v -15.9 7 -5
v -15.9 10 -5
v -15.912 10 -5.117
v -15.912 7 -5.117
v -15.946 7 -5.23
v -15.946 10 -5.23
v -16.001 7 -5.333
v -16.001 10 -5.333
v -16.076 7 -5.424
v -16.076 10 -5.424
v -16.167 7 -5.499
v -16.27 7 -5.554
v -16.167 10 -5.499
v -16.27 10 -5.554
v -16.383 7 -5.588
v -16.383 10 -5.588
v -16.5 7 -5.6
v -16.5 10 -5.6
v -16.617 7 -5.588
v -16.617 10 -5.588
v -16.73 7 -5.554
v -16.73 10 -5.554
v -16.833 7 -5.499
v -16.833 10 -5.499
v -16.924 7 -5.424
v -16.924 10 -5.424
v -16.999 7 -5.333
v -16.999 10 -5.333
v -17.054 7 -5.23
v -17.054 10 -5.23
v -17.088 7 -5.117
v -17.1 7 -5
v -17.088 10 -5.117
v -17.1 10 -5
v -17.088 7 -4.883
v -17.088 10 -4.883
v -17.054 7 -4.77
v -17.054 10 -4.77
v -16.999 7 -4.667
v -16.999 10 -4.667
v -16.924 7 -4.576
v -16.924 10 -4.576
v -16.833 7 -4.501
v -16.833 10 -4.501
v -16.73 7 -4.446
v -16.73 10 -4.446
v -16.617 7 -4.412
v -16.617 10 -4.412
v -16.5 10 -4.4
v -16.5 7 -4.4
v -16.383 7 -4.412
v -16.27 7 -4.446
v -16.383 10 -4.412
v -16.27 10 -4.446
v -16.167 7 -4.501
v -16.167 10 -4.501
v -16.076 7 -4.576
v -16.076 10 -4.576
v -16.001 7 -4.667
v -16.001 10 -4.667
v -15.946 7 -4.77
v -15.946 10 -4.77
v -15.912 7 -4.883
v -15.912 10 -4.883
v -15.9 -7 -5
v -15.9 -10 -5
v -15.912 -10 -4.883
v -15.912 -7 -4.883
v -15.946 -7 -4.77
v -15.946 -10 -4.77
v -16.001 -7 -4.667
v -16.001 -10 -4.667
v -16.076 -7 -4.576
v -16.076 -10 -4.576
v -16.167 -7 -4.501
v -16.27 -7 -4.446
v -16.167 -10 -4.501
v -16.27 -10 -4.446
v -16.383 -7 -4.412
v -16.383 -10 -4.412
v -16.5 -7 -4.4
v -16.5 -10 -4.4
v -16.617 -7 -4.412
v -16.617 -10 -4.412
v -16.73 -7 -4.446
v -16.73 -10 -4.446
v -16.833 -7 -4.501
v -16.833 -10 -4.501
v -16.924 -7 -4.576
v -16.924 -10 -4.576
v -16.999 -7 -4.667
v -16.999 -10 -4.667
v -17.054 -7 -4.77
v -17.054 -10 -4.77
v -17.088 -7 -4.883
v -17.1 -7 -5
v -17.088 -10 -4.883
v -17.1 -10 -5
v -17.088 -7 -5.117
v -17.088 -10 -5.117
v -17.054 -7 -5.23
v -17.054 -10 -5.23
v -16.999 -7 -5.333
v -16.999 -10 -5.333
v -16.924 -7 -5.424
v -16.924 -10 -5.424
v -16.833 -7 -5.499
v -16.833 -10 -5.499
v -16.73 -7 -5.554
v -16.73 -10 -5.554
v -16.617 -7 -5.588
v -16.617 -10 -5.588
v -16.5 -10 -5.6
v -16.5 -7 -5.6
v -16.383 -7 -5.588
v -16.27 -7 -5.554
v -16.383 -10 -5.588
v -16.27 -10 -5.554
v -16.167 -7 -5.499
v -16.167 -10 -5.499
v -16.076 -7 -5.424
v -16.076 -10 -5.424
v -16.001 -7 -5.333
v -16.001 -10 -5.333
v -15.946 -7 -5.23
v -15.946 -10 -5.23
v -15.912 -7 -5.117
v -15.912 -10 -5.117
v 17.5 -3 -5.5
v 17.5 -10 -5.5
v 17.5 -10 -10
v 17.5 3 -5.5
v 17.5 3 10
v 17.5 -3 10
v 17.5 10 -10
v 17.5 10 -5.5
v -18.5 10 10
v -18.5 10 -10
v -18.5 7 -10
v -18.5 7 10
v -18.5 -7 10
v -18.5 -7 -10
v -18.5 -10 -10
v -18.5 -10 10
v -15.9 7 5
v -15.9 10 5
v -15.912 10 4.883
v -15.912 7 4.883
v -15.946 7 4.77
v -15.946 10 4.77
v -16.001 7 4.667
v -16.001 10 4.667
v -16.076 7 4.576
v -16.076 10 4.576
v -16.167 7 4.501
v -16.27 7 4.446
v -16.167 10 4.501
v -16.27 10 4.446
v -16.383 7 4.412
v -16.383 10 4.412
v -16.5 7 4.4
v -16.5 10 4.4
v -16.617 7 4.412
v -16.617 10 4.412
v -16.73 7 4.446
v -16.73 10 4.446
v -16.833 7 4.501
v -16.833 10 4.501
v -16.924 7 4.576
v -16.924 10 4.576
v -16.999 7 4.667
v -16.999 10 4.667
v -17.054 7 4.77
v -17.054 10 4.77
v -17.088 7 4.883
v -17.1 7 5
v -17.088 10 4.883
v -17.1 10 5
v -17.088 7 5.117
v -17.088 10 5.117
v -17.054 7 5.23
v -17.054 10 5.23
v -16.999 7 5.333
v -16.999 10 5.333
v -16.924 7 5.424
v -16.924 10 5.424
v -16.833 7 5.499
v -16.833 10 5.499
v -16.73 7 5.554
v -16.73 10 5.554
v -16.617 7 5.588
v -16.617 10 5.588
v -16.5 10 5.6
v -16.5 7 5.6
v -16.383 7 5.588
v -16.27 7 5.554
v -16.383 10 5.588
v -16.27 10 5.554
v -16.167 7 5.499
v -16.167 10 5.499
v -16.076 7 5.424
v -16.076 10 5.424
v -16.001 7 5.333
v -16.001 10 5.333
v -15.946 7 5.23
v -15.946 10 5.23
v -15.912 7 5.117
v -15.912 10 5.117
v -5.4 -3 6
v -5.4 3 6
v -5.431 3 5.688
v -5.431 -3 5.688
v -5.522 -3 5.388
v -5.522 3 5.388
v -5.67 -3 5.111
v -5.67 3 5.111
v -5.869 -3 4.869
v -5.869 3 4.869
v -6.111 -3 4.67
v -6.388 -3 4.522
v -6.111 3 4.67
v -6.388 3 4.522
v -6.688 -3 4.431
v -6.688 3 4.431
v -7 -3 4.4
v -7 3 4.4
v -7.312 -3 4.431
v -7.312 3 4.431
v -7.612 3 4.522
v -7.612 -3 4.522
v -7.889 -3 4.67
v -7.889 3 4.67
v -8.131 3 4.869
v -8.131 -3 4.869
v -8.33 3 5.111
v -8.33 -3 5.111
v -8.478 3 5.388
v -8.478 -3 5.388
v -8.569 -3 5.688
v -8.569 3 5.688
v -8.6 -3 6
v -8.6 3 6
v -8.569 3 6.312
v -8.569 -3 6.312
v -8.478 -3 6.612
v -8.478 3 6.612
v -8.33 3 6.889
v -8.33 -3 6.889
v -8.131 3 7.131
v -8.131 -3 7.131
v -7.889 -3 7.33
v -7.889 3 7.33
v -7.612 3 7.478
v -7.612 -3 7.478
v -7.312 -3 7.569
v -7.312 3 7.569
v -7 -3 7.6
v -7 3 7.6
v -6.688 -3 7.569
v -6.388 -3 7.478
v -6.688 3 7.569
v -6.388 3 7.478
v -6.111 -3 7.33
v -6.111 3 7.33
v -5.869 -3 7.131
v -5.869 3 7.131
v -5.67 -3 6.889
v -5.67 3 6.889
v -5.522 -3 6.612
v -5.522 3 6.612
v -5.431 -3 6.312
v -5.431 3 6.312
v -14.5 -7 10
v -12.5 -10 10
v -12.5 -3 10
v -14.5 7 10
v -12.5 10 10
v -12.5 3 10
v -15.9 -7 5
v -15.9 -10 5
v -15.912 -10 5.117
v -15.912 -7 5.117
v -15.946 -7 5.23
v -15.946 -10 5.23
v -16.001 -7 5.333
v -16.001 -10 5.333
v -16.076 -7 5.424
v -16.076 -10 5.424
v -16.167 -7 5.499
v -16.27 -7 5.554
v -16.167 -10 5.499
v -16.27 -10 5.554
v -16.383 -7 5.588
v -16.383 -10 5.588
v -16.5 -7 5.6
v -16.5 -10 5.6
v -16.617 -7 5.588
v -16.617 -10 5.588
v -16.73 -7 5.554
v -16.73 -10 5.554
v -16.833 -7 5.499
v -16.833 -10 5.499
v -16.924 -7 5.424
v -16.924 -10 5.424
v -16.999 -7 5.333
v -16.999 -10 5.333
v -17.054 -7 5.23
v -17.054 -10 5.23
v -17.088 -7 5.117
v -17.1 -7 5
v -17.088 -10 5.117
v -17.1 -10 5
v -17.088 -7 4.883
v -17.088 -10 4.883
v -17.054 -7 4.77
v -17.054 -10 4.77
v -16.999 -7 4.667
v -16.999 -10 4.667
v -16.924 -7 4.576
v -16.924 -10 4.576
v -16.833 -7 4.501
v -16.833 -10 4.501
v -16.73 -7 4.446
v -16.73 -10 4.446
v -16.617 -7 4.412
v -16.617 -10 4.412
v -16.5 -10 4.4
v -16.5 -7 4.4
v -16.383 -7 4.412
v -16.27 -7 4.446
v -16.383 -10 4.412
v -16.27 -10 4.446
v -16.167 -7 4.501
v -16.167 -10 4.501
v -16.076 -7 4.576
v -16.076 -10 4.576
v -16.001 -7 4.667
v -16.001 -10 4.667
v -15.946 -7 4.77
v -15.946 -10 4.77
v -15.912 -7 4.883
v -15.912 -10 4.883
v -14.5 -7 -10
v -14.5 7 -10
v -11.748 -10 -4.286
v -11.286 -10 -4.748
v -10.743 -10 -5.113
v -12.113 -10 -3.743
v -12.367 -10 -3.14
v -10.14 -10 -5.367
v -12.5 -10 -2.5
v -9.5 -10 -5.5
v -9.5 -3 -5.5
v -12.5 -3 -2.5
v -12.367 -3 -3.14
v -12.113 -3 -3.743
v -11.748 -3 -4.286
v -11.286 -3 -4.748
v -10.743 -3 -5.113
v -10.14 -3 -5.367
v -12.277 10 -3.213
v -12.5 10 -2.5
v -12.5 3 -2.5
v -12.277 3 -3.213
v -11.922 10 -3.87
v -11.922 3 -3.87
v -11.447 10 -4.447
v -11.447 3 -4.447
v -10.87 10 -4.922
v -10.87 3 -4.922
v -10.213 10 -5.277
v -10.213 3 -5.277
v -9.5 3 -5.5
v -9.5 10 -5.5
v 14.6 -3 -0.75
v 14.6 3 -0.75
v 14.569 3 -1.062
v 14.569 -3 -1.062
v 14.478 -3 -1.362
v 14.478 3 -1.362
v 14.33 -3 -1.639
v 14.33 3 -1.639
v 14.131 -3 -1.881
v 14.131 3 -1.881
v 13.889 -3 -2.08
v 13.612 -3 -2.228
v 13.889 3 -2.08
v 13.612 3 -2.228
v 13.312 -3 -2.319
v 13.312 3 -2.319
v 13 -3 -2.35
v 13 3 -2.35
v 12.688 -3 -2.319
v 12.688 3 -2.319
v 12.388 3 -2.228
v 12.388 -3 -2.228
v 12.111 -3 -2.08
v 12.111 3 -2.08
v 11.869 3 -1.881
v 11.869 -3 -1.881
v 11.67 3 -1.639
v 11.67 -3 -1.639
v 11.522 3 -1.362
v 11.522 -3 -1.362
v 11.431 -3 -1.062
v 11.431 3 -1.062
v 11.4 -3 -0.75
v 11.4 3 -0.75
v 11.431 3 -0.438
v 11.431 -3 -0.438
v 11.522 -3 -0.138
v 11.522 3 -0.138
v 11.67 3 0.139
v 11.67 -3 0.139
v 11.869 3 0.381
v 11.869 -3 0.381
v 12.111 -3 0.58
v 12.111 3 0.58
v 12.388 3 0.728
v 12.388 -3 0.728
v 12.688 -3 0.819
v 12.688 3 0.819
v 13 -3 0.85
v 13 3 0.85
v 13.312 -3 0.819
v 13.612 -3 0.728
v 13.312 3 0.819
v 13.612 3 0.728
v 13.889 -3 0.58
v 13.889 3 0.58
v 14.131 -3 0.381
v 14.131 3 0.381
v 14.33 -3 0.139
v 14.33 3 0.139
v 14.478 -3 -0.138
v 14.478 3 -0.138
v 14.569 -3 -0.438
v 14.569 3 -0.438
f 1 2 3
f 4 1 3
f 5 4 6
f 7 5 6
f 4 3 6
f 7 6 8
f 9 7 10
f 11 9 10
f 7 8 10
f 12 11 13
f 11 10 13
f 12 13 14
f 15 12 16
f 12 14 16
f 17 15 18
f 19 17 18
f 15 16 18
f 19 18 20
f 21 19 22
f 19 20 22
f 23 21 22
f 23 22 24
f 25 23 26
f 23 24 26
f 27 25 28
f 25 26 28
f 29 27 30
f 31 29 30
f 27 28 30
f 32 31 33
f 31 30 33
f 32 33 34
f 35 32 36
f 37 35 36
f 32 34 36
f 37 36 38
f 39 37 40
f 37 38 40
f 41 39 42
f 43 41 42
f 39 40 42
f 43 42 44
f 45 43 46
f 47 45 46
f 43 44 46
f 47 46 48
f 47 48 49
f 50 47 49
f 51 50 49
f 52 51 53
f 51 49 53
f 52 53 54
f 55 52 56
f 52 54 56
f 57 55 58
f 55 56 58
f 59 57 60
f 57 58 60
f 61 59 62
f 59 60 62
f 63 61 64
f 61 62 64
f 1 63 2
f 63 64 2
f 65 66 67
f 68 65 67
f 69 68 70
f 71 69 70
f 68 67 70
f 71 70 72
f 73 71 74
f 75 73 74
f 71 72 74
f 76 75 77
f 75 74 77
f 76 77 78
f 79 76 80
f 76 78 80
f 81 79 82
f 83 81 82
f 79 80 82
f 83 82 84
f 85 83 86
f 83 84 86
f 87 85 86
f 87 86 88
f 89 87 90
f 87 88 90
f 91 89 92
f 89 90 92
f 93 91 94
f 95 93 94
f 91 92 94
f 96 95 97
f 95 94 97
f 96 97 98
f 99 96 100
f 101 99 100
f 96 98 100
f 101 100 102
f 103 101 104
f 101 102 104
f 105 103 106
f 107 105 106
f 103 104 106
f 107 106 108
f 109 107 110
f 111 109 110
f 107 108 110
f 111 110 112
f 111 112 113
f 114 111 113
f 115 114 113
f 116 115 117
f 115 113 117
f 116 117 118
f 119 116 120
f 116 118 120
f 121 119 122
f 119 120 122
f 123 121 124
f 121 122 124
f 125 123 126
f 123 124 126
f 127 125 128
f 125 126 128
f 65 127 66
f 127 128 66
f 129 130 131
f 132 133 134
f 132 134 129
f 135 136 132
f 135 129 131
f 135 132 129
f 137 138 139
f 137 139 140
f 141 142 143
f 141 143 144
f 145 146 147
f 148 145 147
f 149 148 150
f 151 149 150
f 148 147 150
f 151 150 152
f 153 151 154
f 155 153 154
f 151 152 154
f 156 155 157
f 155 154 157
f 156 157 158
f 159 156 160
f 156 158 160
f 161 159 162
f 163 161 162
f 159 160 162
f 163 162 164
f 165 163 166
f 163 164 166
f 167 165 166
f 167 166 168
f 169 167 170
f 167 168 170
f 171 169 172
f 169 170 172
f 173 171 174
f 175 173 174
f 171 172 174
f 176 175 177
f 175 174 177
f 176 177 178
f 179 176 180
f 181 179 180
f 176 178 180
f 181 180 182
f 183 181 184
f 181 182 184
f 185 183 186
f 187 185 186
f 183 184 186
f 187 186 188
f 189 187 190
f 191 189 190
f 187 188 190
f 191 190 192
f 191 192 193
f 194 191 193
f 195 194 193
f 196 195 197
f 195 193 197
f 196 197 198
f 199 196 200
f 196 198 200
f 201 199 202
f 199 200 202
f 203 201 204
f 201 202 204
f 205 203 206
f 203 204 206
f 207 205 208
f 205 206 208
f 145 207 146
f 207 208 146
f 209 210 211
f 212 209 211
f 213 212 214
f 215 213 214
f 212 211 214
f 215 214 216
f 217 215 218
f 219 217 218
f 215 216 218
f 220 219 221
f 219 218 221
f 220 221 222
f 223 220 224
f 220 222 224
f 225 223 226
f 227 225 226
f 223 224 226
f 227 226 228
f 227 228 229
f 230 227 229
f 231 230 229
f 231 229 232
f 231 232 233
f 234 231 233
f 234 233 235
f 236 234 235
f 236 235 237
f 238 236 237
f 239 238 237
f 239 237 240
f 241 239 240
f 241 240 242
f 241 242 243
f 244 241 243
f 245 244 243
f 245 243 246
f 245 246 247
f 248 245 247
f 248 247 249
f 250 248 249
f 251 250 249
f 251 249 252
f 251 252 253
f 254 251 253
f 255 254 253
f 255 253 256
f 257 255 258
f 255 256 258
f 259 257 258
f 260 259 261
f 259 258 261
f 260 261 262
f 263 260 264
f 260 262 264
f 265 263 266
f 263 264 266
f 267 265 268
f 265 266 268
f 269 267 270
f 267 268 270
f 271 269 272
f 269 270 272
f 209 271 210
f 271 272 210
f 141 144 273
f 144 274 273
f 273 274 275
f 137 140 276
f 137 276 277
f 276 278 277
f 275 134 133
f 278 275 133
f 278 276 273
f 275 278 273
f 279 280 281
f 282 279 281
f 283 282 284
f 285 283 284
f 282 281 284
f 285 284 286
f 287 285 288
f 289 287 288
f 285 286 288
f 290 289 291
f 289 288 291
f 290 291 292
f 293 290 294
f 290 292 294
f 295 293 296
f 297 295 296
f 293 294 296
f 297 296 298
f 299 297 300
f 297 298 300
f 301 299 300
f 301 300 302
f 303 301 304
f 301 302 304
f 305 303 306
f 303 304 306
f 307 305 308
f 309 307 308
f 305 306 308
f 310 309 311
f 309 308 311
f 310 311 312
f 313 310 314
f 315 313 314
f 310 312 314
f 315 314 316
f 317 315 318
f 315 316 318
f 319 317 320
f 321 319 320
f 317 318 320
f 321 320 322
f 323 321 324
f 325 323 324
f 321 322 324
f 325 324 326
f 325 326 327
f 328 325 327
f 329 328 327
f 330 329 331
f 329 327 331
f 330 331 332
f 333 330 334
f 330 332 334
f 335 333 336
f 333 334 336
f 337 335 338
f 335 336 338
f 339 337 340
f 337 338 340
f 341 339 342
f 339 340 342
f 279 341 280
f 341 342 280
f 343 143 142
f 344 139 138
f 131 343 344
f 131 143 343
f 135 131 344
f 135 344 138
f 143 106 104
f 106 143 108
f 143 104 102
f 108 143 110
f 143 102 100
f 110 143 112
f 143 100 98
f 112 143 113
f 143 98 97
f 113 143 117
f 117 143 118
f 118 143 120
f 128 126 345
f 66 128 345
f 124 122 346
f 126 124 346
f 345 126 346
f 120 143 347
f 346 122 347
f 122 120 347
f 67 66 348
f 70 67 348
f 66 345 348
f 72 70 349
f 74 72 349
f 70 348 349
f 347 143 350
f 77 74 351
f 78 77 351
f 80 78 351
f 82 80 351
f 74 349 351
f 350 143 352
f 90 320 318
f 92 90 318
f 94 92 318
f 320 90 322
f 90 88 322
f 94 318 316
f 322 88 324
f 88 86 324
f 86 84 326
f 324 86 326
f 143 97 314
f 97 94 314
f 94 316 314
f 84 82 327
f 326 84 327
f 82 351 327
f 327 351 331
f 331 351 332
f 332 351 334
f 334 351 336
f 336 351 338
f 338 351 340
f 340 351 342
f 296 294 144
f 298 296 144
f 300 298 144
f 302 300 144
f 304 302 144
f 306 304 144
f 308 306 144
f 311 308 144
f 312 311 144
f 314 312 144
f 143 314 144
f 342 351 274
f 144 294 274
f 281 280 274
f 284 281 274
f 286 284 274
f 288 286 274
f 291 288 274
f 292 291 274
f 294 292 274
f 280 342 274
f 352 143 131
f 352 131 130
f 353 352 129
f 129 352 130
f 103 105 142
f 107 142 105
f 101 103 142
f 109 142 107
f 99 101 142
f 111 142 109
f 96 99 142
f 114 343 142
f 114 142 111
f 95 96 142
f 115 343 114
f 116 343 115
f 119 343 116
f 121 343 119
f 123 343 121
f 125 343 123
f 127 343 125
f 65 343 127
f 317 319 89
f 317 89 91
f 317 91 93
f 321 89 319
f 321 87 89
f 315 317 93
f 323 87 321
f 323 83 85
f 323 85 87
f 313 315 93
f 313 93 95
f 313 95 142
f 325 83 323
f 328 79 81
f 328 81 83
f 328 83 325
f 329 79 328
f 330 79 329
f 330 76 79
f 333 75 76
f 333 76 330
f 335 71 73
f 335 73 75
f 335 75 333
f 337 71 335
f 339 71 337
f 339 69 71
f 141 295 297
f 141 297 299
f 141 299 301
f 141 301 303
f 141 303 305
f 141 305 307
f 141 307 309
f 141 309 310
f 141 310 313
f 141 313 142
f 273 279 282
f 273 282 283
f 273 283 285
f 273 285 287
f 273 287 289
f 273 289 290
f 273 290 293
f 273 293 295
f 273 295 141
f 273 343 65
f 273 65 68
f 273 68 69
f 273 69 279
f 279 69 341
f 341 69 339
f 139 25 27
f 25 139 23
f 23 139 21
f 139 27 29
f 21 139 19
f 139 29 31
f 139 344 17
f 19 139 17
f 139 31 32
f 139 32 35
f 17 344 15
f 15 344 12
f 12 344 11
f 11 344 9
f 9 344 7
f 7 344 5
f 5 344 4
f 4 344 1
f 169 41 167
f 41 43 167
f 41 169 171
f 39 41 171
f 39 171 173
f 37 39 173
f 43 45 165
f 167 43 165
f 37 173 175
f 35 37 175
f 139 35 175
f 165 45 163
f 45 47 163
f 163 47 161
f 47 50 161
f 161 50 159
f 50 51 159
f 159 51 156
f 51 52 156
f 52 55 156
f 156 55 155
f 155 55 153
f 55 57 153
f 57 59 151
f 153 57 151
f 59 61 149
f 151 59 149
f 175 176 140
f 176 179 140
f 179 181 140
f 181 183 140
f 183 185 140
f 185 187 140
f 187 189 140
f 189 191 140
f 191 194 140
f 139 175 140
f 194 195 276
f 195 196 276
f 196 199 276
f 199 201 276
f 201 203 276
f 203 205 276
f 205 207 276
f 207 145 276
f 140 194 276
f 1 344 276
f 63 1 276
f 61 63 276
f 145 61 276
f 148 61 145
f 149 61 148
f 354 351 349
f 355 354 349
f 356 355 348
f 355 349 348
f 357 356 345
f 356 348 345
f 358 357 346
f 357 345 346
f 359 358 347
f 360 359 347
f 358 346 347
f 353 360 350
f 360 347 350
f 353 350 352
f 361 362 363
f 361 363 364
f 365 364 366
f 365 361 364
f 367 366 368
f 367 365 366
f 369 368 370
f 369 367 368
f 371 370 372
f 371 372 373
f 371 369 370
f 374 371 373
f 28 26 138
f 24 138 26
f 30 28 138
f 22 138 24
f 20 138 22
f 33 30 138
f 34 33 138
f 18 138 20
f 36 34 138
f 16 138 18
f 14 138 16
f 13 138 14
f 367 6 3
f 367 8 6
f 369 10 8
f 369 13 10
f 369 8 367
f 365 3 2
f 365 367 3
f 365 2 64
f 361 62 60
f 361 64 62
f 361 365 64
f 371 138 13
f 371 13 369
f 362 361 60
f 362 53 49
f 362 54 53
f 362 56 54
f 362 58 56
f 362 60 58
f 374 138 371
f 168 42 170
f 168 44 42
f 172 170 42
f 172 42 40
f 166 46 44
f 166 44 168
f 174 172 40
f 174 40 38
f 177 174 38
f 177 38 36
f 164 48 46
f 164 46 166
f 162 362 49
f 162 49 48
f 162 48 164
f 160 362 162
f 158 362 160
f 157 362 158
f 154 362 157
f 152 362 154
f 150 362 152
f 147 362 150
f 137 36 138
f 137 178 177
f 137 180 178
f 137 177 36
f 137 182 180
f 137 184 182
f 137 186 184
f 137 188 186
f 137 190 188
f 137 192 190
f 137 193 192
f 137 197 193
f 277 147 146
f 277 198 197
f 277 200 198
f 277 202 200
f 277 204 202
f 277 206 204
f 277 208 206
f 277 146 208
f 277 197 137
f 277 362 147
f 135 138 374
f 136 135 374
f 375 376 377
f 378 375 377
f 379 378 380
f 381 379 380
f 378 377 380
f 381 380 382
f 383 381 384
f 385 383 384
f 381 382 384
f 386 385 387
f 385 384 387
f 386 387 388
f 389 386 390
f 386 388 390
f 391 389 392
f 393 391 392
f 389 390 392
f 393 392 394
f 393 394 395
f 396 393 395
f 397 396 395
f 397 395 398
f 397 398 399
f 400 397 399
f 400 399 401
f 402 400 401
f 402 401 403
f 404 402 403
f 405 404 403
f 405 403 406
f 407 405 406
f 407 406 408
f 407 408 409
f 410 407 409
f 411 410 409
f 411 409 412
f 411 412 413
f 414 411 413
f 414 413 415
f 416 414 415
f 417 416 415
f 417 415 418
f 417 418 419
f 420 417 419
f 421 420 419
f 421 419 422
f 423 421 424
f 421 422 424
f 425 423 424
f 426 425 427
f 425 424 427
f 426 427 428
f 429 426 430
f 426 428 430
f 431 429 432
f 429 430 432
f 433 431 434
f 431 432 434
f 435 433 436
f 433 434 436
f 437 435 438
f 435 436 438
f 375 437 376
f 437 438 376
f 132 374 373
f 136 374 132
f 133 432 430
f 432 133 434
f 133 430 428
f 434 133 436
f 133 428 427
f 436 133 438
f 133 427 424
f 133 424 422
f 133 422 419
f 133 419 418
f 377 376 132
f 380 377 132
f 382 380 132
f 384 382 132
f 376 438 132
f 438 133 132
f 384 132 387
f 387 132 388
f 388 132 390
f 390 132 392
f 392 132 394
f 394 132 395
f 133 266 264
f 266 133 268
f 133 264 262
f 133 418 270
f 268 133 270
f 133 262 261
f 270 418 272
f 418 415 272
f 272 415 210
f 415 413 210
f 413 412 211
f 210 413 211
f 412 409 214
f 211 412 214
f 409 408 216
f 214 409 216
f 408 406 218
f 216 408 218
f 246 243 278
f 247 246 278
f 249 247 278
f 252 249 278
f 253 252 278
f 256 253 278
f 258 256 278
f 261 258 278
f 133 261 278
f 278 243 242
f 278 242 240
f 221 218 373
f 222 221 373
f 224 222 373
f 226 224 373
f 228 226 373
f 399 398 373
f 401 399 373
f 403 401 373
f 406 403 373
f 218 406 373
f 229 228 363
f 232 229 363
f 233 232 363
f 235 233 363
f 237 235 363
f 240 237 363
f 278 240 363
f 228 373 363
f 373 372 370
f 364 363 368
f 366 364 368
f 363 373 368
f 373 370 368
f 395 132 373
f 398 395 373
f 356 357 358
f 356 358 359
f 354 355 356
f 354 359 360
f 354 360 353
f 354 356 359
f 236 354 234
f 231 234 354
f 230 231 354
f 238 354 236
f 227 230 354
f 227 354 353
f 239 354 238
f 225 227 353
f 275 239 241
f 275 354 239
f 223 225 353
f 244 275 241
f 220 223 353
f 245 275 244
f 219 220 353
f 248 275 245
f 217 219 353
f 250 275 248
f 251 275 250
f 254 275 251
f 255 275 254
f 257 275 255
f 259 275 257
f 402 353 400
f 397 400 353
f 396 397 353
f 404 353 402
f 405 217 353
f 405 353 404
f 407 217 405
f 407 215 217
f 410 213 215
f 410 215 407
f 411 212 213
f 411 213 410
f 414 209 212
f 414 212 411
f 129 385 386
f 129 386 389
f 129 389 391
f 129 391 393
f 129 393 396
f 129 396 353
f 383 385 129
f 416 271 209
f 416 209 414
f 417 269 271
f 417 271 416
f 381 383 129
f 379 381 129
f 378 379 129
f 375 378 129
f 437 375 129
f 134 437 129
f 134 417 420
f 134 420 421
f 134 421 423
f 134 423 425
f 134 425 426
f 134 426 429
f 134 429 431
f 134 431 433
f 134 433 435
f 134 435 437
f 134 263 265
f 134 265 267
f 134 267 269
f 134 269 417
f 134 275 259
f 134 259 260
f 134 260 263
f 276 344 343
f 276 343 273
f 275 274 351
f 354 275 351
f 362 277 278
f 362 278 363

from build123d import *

# Parameters (mm, degrees)
SKETCH1_W           = 35
SKETCH1_H           = 20
BOSS_EXTRUDE2_DEPTH = 10
CUT_EXTRUDE1_DEPTH  = 7
CUT_EXTRUDE2_DEPTH  = 7
SKETCH8_R           = 1.6
CUT_EXTRUDE3_DEPTH  = 7
SKETCH9_W           = 20
SKETCH9_H           = 14
CUT_EXTRUDE4_DEPTH  = 3
SKETCH10_R          = 0.6
CUT_EXTRUDE5_DEPTH  = 3
SKETCH11_R          = 0.6
CUT_EXTRUDE6_DEPTH  = 3
SKETCH12_W          = 20
SKETCH12_H          = 3
BOSS_EXTRUDE3_DEPTH = 1
SKETCH13_W          = 20
SKETCH13_H          = 3
BOSS_EXTRUDE4_DEPTH = 1


with BuildPart() as part:
    # Sketch1 → Boss-Extrude2 (new body, symmetric)
    with BuildSketch(Plane(origin=(0, 0, 0), x_dir=(1, 0, 0), z_dir=(0, 1, 0))):
        Rectangle(SKETCH1_W, SKETCH1_H)
    extrude(amount=BOSS_EXTRUDE2_DEPTH, both=True)

    # Sketch4 → Cut-Extrude1 (cut)
    with BuildSketch(Plane(origin=(0, 10, 0), x_dir=(1, 0, 0), z_dir=(0, 1, 0))):
        with BuildLine():
            Line((-12.5, -10), (-12.5, 2.5))
            ThreePointArc((-12.5, 2.5), (-11.447225408, 4.447225408), (-9.5, 5.5))
            Line((-9.5, 5.5), (17.5, 5.5))
            Line((17.5, 5.5), (17.5, -10))
            Line((17.5, -10), (-12.5, -10))
        make_face()
    extrude(amount=-CUT_EXTRUDE1_DEPTH, mode=Mode.SUBTRACT)

    # Sketch6 → Cut-Extrude2 (cut)
    with BuildSketch(Plane.XZ.offset(10)):
        with BuildLine():
            Line((-12.5, 10), (-12.5, -2.5))
            ThreePointArc((-12.5, -2.5), (-11.528297563, -4.528297563), (-9.5, -5.5))
            Line((-9.5, -5.5), (17.5, -5.5))
            Line((17.5, -5.5), (17.5, 10))
            Line((17.5, 10), (-12.5, 10))
        make_face()
    extrude(amount=-CUT_EXTRUDE2_DEPTH, mode=Mode.SUBTRACT)

    # Sketch8 → Cut-Extrude3 (cut)
    with BuildSketch(Plane(origin=(0, 3, 0), x_dir=(1, 0, 0), z_dir=(0, 1, 0))):
        with Locations((-7, -6)):
            Circle(SKETCH8_R)
        with Locations((13, 0.75)):
            Circle(SKETCH8_R)
    extrude(amount=-CUT_EXTRUDE3_DEPTH, mode=Mode.SUBTRACT)

    # Sketch9 → Cut-Extrude4 (cut)
    with BuildSketch(Plane.ZY.offset(17.5)):
        Rectangle(SKETCH9_W, SKETCH9_H)
    extrude(amount=-CUT_EXTRUDE4_DEPTH, mode=Mode.SUBTRACT)

    # Sketch10 → Cut-Extrude5 (cut)
    with BuildSketch(Plane(origin=(0, 10, 0), x_dir=(1, 0, 0), z_dir=(0, 1, 0))):
        with Locations((-16.5, 5)):
            Circle(SKETCH10_R)
        with Locations((-16.5, -5)):
            Circle(SKETCH10_R)
    extrude(amount=-CUT_EXTRUDE5_DEPTH, mode=Mode.SUBTRACT)

    # Sketch11 → Cut-Extrude6 (cut)
    with BuildSketch(Plane.XZ.offset(10)):
        with Locations((-16.5, 5)):
            Circle(SKETCH11_R)
        with Locations((-16.5, -5)):
            Circle(SKETCH11_R)
    extrude(amount=-CUT_EXTRUDE6_DEPTH, mode=Mode.SUBTRACT)

    # Sketch12 → Boss-Extrude3 (add)
    with BuildSketch(Plane.ZY.offset(17.5)):
        with Locations((0, 8.5)):
            Rectangle(SKETCH12_W, SKETCH12_H)
    extrude(amount=BOSS_EXTRUDE3_DEPTH)

    # Sketch13 → Boss-Extrude4 (add)
    with BuildSketch(Plane.ZY.offset(17.5)):
        with Locations((0, -8.5)):
            Rectangle(SKETCH13_W, SKETCH13_H)
    extrude(amount=BOSS_EXTRUDE4_DEPTH)


solid = part.part
